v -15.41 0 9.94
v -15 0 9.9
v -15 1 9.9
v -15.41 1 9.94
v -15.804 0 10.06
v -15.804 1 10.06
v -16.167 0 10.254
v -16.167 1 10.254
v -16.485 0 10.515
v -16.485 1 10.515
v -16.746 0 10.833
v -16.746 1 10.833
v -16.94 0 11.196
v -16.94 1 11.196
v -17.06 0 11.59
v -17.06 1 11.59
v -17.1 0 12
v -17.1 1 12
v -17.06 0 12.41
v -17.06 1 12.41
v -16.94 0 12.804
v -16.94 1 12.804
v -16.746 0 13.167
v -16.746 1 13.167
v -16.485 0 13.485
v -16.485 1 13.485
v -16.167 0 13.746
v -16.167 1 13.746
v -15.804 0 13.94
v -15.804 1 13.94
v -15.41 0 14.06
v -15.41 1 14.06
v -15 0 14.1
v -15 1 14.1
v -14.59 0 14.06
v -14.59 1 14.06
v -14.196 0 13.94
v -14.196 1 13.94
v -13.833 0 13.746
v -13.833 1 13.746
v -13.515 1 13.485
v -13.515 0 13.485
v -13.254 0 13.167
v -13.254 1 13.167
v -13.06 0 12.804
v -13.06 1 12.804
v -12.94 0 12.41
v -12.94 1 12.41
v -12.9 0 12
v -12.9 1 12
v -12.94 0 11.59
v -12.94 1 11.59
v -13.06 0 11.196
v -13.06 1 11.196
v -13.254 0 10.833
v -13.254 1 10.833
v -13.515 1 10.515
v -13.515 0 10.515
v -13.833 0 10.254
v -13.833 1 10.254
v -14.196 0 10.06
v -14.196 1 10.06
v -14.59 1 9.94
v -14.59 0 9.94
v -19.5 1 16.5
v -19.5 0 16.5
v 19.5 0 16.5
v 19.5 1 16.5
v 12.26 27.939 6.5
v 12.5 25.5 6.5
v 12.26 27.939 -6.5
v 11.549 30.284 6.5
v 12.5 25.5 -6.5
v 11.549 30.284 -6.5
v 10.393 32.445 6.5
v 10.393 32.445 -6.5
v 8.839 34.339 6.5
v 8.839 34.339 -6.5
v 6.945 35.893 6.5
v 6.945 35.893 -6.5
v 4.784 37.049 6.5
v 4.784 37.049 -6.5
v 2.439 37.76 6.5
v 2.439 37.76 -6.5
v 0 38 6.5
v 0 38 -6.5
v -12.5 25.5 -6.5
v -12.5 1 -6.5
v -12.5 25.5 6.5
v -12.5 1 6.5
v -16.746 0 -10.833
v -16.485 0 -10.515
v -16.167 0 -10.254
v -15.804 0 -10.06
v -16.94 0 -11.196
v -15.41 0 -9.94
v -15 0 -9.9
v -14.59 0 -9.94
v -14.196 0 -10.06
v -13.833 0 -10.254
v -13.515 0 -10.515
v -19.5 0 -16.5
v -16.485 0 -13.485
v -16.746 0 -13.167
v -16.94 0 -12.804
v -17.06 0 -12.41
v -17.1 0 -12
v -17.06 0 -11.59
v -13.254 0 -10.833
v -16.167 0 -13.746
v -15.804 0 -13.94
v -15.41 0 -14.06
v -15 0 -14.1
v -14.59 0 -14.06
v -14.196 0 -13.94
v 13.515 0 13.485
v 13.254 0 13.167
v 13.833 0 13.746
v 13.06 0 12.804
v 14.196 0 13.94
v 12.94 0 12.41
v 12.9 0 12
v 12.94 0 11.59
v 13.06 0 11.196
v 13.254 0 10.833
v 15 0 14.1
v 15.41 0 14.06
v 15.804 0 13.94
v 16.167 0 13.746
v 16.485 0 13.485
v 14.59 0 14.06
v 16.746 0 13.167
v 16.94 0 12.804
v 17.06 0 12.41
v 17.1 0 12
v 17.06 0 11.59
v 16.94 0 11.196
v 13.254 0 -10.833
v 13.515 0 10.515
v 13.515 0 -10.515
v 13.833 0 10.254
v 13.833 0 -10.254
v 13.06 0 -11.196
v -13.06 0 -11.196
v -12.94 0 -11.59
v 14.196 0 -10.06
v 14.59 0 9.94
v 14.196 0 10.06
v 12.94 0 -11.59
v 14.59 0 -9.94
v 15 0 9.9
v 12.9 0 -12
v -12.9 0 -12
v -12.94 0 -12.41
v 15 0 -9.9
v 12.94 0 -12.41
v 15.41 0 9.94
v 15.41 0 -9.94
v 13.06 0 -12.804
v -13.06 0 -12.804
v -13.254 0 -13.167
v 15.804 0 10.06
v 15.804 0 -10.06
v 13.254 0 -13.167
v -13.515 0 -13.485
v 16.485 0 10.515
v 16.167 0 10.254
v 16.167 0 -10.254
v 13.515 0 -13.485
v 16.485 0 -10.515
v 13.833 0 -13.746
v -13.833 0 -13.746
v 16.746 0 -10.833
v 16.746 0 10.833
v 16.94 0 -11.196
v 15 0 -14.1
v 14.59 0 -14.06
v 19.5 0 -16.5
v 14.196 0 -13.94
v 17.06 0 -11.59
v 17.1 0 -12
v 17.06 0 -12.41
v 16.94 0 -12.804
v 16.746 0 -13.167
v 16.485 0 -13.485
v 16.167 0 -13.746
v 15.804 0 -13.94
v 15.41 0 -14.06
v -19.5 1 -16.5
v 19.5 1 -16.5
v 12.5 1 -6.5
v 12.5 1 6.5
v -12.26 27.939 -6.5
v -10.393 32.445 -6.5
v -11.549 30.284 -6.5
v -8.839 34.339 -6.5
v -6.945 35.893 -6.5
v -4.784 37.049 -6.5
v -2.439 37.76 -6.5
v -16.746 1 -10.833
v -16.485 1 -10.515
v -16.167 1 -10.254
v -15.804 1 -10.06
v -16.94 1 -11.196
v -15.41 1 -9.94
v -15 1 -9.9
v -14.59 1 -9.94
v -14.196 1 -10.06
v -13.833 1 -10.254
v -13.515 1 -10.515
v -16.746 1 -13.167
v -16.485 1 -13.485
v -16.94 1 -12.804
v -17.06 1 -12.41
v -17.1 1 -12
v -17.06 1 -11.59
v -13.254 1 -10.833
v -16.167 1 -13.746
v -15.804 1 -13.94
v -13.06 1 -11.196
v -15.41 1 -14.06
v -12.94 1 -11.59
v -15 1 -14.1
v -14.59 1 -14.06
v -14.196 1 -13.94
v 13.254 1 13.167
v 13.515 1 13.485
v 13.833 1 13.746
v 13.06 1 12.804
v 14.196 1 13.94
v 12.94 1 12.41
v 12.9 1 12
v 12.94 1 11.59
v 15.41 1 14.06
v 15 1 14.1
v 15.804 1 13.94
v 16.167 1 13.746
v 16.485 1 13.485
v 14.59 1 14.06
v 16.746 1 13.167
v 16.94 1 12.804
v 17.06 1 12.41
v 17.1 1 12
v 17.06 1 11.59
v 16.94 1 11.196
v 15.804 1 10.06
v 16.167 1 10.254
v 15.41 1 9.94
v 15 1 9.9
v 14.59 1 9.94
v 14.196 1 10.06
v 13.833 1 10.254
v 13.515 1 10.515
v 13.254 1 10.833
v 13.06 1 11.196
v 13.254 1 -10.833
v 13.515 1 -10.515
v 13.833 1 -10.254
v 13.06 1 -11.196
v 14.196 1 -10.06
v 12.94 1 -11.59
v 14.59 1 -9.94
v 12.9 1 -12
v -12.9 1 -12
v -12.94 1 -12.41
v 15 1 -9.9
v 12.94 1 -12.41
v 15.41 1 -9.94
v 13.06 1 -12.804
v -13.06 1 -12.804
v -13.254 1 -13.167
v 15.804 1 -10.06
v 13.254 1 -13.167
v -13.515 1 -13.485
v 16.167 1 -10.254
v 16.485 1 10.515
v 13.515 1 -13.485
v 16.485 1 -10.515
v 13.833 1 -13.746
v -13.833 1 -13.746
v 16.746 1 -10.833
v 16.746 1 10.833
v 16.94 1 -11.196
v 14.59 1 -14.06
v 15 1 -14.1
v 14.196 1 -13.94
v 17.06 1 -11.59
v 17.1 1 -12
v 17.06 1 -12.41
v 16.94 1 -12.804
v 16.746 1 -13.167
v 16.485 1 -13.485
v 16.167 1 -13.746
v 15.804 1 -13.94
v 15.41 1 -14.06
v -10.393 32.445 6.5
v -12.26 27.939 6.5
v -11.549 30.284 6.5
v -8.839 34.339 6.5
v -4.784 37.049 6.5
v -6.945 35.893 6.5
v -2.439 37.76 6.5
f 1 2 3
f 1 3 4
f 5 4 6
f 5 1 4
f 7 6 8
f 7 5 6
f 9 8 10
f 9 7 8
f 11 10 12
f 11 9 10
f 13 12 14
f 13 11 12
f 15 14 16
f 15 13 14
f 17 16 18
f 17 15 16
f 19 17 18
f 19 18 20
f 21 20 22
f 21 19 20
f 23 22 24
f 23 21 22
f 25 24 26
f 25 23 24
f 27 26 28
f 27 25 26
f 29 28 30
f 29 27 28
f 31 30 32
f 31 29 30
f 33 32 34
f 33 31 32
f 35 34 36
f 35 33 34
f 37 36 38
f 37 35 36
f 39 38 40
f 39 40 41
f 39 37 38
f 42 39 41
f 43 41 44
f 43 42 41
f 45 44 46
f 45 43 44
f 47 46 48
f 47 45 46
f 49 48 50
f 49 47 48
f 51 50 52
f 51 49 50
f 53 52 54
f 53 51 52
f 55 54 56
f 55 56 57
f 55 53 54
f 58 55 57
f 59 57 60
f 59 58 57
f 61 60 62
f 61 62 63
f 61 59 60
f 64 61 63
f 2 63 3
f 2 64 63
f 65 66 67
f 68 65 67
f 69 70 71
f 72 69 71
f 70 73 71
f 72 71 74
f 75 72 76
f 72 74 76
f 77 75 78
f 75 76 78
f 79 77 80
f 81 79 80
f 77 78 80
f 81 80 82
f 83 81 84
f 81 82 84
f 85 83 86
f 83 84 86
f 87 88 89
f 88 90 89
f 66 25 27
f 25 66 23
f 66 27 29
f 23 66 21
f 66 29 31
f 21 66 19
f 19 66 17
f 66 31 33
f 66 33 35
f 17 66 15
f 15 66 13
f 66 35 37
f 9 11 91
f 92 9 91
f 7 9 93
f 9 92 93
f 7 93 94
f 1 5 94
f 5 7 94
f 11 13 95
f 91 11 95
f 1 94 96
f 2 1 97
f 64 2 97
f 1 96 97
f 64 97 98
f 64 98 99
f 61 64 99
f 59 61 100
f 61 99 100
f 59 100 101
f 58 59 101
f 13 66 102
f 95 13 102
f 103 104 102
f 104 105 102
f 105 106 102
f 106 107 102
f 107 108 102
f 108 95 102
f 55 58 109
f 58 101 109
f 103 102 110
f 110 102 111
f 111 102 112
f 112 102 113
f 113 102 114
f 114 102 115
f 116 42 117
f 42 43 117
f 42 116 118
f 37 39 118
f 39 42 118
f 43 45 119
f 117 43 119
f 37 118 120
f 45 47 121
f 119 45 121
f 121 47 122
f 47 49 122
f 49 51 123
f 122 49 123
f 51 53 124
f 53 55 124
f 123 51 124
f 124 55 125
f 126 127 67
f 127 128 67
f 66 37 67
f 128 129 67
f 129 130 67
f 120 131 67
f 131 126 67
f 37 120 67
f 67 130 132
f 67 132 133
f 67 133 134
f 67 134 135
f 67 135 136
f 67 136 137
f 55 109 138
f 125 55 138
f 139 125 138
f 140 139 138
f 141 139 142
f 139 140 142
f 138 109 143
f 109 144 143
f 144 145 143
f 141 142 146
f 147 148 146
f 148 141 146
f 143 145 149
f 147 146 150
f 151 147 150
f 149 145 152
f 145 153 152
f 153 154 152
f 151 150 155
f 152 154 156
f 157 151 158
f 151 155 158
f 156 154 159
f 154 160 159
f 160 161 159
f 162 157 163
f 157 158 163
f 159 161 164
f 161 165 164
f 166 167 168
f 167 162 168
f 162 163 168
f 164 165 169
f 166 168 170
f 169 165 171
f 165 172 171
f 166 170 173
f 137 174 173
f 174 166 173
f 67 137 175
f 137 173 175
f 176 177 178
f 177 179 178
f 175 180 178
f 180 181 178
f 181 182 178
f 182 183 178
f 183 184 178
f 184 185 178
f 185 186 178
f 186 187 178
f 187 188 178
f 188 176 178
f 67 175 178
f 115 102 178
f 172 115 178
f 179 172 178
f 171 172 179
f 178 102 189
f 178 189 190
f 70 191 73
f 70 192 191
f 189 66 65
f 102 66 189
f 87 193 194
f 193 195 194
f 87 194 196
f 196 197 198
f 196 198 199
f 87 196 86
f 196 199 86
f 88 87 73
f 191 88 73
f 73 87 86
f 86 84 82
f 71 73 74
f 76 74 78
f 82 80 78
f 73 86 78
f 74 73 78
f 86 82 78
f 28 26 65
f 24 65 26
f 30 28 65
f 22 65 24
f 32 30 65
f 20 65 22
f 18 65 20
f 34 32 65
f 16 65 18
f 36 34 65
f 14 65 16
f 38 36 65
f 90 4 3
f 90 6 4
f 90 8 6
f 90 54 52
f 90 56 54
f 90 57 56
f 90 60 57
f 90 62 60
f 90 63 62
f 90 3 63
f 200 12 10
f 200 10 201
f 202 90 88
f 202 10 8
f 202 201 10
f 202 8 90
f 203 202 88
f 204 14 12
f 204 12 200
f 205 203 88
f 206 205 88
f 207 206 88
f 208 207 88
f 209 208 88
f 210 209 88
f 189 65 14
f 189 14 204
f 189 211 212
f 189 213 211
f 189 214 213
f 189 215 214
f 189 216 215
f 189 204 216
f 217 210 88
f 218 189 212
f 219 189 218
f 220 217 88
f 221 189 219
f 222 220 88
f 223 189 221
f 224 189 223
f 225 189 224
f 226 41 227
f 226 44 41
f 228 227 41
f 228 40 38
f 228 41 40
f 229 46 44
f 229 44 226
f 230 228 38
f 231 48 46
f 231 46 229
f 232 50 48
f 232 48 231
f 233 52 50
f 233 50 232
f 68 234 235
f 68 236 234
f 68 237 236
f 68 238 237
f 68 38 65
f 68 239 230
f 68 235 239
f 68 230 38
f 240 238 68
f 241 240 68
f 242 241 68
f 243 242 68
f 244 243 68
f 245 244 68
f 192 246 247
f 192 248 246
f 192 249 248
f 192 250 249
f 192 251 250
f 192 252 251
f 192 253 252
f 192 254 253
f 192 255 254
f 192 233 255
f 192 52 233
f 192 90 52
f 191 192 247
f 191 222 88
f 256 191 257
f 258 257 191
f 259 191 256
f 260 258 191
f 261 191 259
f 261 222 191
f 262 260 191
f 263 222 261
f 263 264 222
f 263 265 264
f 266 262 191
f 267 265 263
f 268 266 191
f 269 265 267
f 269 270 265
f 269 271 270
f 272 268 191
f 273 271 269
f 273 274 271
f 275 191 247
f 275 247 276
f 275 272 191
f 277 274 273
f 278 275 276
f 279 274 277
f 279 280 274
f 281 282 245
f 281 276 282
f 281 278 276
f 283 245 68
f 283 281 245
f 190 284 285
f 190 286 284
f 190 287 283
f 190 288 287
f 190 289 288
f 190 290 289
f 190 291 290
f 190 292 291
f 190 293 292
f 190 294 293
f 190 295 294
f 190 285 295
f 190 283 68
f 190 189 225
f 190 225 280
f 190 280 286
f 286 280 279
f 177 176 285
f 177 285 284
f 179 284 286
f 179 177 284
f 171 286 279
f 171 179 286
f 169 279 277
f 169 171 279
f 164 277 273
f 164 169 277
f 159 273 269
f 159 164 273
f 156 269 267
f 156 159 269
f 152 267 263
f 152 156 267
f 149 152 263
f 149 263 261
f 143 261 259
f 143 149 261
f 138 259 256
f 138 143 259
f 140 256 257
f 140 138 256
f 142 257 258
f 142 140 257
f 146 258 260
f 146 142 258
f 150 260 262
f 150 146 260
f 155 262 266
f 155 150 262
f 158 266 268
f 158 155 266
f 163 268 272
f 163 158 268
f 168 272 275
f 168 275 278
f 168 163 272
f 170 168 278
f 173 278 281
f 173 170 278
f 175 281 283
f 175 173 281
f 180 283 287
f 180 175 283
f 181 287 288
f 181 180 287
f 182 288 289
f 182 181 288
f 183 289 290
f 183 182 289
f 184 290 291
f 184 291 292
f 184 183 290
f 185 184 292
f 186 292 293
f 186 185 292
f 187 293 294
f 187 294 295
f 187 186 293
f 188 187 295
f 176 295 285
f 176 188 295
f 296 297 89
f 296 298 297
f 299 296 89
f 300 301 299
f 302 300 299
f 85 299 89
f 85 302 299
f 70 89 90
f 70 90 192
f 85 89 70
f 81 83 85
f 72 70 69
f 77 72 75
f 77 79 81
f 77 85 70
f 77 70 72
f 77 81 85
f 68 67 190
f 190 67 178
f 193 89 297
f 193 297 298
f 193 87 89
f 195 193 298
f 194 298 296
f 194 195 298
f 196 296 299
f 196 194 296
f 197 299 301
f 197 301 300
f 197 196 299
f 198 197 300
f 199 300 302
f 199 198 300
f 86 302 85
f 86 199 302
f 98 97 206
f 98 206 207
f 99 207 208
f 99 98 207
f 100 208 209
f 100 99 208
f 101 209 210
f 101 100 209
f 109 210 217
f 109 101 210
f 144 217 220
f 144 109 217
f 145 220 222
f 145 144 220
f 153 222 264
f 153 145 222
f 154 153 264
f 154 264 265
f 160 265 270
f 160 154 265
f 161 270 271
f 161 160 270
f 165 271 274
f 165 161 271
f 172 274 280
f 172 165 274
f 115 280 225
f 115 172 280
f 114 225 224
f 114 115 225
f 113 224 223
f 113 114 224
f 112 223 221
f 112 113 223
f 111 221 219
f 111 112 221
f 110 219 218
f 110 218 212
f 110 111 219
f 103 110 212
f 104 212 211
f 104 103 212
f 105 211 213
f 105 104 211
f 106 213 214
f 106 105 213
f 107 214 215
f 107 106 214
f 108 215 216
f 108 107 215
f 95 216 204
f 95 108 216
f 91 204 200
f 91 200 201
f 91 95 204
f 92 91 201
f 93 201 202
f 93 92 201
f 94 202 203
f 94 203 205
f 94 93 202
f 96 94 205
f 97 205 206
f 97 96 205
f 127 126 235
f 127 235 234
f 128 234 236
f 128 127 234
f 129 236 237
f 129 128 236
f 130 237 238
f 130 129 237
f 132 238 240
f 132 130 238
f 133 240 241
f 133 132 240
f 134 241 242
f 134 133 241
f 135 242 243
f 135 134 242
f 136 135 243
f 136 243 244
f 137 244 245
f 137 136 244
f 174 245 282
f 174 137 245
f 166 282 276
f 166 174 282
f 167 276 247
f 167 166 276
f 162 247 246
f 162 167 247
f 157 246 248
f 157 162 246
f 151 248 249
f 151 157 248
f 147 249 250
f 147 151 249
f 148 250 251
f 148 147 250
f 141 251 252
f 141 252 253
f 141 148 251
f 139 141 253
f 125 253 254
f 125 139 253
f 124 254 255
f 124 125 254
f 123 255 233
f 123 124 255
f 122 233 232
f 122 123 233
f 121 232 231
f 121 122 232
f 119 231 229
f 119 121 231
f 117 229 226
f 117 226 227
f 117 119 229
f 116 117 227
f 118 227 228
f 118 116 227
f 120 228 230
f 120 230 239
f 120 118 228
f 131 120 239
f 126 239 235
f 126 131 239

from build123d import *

# Parameters (mm, degrees)
SKETCH_1_W      = 39
SKETCH_1_H      = 33
SKETCH_1_R      = 2.1
EXTRUDE_1_DEPTH = 1
SKETCH_2_W      = 25
SKETCH_2_H      = 37
EXTRUDE_2_DEPTH = 6.5
FILLET_1_R      = 12.5


with BuildPart() as part:
    # 草图1 → 凸台-拉伸1 (new body)
    with BuildSketch(Plane(origin=(0, 0, 0), x_dir=(1, 0, 0), z_dir=(0, 1, 0))):
        Rectangle(SKETCH_1_W, SKETCH_1_H)
        with Locations(Location((-15, 12, 0), (0, 0, 270))):
            Circle(SKETCH_1_R, mode=Mode.SUBTRACT)
        with Locations(Location((15, 12, 0), (0, 0, 90))):
            Circle(SKETCH_1_R, mode=Mode.SUBTRACT)
        with Locations(Location((15, -12, 0), (0, 0, 270))):
            Circle(SKETCH_1_R, mode=Mode.SUBTRACT)
        with Locations(Location((-15, -12, 0), (0, 0, 90))):
            Circle(SKETCH_1_R, mode=Mode.SUBTRACT)
    extrude(amount=EXTRUDE_1_DEPTH)

    # 草图2 → 凸台-拉伸2 (add, symmetric)
    with BuildSketch(Plane.XY):
        with Locations((0, 19.5)):
            Rectangle(SKETCH_2_W, SKETCH_2_H)
    extrude(amount=EXTRUDE_2_DEPTH, both=True)

    # 圆角1
    fillet_1_edges = [part.edges().sort_by_distance(p)[0] for p in [
        (-12.5, 38, 0),
        (12.5, 38, 0),
    ]]
    fillet(fillet_1_edges, radius=FILLET_1_R - 0.0001)  # a hair under: the kernel refuses the full size


solid = part.part
